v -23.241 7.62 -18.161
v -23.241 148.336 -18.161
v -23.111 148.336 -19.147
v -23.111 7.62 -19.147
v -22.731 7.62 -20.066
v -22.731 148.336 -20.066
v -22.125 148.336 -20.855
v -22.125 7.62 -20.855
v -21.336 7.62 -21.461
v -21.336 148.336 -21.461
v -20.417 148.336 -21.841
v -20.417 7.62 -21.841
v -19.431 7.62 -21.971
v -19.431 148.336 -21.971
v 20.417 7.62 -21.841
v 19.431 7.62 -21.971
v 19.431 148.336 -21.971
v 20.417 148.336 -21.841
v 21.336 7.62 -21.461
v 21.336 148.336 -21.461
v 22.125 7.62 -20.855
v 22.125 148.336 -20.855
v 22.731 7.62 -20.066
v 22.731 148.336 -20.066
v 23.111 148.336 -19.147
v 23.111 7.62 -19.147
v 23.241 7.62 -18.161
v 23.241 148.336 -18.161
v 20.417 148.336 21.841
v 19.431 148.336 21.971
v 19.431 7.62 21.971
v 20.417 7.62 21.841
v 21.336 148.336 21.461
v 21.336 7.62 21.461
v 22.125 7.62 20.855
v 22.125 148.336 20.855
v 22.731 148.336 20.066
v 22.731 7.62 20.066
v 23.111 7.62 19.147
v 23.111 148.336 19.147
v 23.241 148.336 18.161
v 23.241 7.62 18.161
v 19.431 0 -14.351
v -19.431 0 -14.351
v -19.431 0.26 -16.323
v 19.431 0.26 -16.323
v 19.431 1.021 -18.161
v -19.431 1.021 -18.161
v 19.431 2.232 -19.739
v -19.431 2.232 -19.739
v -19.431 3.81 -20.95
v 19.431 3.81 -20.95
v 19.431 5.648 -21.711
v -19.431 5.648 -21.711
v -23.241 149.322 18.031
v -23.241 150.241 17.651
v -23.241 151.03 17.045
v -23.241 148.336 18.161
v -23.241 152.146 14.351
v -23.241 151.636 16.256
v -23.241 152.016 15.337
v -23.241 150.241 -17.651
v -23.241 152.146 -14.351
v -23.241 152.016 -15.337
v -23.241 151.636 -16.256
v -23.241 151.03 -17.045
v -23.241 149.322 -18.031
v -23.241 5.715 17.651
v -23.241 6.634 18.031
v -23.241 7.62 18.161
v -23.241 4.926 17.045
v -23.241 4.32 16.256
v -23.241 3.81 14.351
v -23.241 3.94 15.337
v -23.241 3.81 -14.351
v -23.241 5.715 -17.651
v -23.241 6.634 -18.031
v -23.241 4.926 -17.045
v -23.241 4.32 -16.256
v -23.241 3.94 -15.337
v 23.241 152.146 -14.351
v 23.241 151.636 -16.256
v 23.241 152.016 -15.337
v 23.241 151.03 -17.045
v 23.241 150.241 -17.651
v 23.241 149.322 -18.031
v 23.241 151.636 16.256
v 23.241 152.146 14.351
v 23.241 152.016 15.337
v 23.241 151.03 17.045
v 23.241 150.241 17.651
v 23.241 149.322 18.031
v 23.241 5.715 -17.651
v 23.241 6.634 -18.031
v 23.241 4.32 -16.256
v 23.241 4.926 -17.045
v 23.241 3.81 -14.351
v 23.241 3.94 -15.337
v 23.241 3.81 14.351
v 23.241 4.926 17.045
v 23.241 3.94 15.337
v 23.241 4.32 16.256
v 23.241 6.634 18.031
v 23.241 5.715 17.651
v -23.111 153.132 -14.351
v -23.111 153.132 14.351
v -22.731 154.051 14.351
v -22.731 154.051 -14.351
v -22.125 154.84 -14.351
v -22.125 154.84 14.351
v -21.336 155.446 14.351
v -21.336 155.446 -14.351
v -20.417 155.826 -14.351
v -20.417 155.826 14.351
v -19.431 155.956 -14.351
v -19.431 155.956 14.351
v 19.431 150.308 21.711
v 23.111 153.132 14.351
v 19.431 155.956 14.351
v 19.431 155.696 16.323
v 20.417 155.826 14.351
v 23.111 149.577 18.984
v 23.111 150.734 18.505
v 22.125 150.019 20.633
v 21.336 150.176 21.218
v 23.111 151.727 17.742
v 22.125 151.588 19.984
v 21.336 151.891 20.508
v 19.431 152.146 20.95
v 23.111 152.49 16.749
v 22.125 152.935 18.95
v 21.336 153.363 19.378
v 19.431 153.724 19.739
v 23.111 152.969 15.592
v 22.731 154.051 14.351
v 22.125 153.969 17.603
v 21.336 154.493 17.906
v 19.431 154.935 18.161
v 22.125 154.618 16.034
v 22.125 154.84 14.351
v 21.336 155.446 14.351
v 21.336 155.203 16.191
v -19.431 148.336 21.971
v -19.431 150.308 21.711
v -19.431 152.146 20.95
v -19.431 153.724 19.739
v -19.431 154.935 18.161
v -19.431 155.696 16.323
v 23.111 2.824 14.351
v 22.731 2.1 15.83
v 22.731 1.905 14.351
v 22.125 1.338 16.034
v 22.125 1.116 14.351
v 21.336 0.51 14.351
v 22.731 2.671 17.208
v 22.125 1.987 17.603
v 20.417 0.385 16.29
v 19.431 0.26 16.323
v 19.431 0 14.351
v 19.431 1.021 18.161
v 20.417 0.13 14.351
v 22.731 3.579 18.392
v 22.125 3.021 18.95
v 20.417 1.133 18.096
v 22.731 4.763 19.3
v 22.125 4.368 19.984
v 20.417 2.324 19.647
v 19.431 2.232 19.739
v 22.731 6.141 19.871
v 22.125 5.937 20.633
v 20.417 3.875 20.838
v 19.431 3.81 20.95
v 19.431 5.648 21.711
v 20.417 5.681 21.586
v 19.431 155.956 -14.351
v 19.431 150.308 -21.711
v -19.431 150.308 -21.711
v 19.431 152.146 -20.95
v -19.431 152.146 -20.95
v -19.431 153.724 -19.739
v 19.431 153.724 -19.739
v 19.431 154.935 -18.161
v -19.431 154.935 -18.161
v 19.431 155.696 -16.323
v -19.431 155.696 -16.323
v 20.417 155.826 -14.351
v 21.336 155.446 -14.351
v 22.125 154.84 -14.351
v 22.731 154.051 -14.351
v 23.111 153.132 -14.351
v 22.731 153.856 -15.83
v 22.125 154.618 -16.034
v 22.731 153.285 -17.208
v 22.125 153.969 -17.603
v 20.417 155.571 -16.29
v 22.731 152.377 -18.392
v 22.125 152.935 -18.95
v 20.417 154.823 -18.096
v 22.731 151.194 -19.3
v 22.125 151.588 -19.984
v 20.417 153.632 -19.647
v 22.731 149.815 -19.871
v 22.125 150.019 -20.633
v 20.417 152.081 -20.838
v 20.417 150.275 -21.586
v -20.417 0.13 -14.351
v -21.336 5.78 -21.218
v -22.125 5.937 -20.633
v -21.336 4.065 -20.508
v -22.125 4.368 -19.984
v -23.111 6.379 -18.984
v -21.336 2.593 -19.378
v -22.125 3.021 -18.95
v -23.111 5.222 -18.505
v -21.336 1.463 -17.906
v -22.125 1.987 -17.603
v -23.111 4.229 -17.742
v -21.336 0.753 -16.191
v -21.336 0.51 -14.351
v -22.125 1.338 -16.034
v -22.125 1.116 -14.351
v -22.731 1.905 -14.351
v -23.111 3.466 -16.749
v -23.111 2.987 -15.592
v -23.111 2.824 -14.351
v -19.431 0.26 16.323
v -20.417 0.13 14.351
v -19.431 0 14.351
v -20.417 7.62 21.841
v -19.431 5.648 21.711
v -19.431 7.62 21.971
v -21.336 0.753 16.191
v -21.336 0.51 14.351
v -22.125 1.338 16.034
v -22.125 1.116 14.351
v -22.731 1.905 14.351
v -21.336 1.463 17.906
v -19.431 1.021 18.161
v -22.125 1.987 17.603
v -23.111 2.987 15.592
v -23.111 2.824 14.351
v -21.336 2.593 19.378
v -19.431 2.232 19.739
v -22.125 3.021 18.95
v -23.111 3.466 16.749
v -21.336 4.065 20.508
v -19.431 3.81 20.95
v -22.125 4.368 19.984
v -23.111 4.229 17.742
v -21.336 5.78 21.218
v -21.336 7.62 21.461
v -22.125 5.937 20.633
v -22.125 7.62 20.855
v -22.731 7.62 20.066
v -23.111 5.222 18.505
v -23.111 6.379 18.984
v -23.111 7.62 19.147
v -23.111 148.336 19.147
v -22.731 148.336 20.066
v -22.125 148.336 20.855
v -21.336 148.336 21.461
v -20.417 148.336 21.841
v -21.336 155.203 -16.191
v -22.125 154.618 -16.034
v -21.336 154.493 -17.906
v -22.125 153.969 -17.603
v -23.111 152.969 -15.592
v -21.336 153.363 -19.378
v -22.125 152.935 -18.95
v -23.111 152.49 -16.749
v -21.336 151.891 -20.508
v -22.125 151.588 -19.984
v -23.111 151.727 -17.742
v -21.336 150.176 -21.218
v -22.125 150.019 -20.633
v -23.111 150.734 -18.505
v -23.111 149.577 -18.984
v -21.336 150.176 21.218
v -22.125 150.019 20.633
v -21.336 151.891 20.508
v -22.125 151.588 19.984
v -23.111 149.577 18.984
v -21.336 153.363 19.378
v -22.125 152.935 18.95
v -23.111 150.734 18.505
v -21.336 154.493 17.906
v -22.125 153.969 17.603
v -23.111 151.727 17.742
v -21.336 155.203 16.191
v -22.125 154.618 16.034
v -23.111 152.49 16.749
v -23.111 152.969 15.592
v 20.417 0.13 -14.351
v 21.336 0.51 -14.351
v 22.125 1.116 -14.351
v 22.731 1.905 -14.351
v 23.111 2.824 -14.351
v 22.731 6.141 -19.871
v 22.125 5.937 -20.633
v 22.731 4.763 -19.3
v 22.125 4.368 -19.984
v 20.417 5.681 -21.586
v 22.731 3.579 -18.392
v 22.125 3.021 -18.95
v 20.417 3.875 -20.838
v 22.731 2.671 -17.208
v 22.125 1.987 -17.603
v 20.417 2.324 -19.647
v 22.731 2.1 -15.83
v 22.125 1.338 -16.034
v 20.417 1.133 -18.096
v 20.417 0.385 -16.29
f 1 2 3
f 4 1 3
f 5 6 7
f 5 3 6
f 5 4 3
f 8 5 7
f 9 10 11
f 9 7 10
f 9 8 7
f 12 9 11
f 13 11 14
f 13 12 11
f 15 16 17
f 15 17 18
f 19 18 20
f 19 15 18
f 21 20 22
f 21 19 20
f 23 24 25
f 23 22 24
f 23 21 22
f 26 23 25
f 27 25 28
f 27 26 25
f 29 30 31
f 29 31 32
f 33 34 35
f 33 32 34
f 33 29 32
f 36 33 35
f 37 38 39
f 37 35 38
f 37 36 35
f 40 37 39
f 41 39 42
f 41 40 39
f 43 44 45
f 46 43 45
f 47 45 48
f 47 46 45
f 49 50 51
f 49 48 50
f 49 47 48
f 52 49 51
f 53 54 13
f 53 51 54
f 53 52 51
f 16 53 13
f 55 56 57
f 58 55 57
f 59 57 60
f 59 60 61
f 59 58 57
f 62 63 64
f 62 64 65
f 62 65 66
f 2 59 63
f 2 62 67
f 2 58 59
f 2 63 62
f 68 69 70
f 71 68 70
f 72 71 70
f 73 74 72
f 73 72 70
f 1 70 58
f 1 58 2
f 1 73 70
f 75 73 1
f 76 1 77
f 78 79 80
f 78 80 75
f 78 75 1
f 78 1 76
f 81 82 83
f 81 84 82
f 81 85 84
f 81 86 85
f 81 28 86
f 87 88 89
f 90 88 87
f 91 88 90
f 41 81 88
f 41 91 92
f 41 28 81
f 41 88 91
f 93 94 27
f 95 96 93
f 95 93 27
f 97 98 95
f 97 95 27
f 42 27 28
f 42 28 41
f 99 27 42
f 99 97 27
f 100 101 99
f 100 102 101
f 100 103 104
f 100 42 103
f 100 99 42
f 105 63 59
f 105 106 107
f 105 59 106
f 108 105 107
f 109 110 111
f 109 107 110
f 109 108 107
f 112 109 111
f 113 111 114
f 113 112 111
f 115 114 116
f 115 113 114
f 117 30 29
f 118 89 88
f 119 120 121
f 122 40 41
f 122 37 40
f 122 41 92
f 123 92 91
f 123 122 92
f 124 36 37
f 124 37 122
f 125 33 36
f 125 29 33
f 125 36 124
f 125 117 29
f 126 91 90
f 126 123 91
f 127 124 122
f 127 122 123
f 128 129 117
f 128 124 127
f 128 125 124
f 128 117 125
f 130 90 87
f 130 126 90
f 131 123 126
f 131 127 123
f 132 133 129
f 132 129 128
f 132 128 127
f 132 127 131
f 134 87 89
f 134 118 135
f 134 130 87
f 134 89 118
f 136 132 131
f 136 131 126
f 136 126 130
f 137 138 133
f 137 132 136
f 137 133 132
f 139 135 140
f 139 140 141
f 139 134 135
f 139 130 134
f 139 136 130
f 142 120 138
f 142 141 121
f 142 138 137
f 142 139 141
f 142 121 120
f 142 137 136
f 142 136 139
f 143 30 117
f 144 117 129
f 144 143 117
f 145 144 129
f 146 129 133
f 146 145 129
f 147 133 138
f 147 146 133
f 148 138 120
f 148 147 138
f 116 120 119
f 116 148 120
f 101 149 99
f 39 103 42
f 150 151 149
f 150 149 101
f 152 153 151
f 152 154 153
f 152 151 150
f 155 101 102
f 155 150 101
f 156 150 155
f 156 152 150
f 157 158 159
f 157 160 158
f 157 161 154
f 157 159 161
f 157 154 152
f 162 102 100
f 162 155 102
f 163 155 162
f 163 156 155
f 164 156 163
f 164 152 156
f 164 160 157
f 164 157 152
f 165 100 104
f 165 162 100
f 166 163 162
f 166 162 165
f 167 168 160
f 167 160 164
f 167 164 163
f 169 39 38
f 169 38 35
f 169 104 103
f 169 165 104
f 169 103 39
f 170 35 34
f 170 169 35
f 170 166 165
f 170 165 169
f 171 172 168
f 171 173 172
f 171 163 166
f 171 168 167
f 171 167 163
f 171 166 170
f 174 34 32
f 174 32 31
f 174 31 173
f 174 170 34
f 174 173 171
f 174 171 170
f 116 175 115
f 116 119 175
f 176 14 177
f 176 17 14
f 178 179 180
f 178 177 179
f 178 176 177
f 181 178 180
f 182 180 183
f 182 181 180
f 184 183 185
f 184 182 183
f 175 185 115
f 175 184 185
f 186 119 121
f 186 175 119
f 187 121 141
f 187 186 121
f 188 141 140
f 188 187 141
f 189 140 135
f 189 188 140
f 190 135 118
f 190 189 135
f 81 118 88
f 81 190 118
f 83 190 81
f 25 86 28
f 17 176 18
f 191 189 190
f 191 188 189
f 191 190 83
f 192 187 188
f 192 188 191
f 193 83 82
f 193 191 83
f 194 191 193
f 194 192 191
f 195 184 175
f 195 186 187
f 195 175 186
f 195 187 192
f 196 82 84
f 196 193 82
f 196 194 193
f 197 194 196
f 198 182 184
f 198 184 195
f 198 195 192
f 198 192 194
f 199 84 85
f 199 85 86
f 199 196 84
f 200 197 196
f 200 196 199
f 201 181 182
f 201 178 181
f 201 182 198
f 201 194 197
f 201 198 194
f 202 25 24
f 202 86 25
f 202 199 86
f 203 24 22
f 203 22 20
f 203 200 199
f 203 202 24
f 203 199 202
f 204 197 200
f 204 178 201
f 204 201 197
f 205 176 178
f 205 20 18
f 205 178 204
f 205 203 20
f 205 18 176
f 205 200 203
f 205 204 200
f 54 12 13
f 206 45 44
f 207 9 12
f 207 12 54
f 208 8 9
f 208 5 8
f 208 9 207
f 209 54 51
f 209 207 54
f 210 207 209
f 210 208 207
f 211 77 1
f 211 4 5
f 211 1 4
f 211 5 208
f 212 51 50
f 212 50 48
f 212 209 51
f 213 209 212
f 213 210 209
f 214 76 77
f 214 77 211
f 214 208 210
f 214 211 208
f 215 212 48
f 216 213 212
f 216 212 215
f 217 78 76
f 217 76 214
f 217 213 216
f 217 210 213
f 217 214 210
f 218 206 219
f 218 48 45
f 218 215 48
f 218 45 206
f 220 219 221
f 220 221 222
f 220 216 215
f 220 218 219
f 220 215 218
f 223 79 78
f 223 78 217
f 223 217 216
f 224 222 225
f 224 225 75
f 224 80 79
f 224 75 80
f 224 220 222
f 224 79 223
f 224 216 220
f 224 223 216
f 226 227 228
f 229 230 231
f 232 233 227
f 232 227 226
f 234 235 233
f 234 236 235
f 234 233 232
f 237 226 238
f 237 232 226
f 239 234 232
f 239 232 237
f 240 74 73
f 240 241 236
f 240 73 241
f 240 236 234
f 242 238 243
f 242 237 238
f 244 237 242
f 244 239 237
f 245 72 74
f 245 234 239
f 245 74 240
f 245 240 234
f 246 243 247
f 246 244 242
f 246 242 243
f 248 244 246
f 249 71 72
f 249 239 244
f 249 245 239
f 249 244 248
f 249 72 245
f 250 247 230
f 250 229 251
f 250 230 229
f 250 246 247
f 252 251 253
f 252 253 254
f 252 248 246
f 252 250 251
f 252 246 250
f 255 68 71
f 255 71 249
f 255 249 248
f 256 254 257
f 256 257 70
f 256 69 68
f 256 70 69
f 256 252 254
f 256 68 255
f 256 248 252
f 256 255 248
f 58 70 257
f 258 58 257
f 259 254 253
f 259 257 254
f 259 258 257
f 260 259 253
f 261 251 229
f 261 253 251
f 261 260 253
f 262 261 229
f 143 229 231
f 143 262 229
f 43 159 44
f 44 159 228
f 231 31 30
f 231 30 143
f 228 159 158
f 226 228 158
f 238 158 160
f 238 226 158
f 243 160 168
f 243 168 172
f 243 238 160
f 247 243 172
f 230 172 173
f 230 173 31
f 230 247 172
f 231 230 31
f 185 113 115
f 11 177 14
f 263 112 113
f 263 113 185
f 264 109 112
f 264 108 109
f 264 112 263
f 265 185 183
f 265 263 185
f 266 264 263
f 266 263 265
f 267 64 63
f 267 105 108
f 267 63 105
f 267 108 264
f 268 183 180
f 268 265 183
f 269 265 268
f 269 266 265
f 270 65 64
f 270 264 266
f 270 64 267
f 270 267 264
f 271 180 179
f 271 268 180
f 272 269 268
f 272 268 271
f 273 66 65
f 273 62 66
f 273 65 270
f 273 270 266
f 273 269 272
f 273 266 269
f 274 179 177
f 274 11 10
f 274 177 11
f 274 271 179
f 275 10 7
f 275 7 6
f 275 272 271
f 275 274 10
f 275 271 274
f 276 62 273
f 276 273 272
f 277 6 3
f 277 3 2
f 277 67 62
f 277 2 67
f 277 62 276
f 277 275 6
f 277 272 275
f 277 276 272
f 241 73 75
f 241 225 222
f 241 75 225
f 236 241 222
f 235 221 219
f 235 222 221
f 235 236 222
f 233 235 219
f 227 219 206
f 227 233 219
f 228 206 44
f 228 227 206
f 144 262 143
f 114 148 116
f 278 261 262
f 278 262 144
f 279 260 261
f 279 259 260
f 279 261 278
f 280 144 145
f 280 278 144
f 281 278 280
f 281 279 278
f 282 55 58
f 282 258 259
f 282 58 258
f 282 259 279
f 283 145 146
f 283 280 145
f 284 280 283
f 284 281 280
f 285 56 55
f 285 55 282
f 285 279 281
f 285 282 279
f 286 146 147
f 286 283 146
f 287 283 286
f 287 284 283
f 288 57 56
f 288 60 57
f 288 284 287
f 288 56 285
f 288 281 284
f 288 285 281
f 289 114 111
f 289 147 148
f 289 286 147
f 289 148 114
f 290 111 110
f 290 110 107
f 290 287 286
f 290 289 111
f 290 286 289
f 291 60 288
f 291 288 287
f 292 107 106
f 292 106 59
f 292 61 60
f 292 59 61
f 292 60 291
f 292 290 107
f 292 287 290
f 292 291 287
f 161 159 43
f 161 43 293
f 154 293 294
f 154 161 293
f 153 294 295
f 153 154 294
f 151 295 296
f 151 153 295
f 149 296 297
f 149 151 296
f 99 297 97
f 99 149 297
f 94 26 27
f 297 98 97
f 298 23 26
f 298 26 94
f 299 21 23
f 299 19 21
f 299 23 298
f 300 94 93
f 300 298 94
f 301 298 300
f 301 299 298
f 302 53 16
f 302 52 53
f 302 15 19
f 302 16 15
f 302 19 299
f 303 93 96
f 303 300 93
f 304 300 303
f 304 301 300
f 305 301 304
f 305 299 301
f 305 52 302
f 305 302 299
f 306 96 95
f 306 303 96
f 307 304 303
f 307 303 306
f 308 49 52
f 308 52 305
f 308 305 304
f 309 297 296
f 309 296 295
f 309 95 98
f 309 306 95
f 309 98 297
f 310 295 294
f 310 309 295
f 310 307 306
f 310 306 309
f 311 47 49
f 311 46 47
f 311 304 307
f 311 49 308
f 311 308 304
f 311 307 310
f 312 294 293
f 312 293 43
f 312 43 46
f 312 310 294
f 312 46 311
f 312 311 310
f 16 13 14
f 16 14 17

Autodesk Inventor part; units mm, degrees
ref_plane "YZ Plane" through (0, 0, 0) normal (1, 0, 0) x (0, 1, 0)
sketch "Sketch1" plane through (0, 0, 0) normal (0, 1, 0) x (-1, 0, 0)
  line L0 (-23.241, 21.971) -> (23.241, 21.971)
  line L1 (23.241, 21.971) -> (23.241, -21.971)
  line L2 (23.241, -21.971) -> (-23.241, -21.971)
  line L3 (-23.241, -21.971) -> (-23.241, 21.971)
  line L4 (-23.241, 21.971) -> (23.241, -21.971) construction
  line L5 (23.241, 21.971) -> (-23.241, -21.971) construction
  point P0 (0, 0)
  dimension "d0" = 46.482
  dimension "d1" = 43.942
extrude "Extrusion1" add sketch "Sketch1" along normal blind 155.956
fillet "Fillet1" radius 7.62 4 edges at (0, 155.956, -21.971) (0, 155.956, 21.971) (0, 0, -21.971) (0, 0, 21.971)
fillet "Fillet2" radius 3.81 16 edges at (23.241, 153.7242, 19.7392) (23.241, 155.956, 0) (23.241, 153.7242, -19.7392) (23.241, 77.978, -21.971) (23.241, 2.2318, -19.7392) (23.241, 0, 0) (23.241, 2.2318, 19.7392) (23.241, 77.978, 21.971) (-23.241, 153.7242, 19.7392) (-23.241, 155.956, 0) (-23.241, 153.7242, -19.7392) (-23.241, 77.978, -21.971) (-23.241, 2.2318, -19.7392) (-23.241, 0, 0) (-23.241, 2.2318, 19.7392) (-23.241, 77.978, 21.971)
ref_plane "Work Plane1" through (-19.431, 7.62, 0) normal (0, 0, 1) x (1, 0, 0)
ref_plane "Work Plane2" through (0, 7.62, -18.161) normal (-1, 0, 0) x (0, 0, 1)
properties part number "OVONIC 6S LiPo Battery" material "PAEK Plastic"
